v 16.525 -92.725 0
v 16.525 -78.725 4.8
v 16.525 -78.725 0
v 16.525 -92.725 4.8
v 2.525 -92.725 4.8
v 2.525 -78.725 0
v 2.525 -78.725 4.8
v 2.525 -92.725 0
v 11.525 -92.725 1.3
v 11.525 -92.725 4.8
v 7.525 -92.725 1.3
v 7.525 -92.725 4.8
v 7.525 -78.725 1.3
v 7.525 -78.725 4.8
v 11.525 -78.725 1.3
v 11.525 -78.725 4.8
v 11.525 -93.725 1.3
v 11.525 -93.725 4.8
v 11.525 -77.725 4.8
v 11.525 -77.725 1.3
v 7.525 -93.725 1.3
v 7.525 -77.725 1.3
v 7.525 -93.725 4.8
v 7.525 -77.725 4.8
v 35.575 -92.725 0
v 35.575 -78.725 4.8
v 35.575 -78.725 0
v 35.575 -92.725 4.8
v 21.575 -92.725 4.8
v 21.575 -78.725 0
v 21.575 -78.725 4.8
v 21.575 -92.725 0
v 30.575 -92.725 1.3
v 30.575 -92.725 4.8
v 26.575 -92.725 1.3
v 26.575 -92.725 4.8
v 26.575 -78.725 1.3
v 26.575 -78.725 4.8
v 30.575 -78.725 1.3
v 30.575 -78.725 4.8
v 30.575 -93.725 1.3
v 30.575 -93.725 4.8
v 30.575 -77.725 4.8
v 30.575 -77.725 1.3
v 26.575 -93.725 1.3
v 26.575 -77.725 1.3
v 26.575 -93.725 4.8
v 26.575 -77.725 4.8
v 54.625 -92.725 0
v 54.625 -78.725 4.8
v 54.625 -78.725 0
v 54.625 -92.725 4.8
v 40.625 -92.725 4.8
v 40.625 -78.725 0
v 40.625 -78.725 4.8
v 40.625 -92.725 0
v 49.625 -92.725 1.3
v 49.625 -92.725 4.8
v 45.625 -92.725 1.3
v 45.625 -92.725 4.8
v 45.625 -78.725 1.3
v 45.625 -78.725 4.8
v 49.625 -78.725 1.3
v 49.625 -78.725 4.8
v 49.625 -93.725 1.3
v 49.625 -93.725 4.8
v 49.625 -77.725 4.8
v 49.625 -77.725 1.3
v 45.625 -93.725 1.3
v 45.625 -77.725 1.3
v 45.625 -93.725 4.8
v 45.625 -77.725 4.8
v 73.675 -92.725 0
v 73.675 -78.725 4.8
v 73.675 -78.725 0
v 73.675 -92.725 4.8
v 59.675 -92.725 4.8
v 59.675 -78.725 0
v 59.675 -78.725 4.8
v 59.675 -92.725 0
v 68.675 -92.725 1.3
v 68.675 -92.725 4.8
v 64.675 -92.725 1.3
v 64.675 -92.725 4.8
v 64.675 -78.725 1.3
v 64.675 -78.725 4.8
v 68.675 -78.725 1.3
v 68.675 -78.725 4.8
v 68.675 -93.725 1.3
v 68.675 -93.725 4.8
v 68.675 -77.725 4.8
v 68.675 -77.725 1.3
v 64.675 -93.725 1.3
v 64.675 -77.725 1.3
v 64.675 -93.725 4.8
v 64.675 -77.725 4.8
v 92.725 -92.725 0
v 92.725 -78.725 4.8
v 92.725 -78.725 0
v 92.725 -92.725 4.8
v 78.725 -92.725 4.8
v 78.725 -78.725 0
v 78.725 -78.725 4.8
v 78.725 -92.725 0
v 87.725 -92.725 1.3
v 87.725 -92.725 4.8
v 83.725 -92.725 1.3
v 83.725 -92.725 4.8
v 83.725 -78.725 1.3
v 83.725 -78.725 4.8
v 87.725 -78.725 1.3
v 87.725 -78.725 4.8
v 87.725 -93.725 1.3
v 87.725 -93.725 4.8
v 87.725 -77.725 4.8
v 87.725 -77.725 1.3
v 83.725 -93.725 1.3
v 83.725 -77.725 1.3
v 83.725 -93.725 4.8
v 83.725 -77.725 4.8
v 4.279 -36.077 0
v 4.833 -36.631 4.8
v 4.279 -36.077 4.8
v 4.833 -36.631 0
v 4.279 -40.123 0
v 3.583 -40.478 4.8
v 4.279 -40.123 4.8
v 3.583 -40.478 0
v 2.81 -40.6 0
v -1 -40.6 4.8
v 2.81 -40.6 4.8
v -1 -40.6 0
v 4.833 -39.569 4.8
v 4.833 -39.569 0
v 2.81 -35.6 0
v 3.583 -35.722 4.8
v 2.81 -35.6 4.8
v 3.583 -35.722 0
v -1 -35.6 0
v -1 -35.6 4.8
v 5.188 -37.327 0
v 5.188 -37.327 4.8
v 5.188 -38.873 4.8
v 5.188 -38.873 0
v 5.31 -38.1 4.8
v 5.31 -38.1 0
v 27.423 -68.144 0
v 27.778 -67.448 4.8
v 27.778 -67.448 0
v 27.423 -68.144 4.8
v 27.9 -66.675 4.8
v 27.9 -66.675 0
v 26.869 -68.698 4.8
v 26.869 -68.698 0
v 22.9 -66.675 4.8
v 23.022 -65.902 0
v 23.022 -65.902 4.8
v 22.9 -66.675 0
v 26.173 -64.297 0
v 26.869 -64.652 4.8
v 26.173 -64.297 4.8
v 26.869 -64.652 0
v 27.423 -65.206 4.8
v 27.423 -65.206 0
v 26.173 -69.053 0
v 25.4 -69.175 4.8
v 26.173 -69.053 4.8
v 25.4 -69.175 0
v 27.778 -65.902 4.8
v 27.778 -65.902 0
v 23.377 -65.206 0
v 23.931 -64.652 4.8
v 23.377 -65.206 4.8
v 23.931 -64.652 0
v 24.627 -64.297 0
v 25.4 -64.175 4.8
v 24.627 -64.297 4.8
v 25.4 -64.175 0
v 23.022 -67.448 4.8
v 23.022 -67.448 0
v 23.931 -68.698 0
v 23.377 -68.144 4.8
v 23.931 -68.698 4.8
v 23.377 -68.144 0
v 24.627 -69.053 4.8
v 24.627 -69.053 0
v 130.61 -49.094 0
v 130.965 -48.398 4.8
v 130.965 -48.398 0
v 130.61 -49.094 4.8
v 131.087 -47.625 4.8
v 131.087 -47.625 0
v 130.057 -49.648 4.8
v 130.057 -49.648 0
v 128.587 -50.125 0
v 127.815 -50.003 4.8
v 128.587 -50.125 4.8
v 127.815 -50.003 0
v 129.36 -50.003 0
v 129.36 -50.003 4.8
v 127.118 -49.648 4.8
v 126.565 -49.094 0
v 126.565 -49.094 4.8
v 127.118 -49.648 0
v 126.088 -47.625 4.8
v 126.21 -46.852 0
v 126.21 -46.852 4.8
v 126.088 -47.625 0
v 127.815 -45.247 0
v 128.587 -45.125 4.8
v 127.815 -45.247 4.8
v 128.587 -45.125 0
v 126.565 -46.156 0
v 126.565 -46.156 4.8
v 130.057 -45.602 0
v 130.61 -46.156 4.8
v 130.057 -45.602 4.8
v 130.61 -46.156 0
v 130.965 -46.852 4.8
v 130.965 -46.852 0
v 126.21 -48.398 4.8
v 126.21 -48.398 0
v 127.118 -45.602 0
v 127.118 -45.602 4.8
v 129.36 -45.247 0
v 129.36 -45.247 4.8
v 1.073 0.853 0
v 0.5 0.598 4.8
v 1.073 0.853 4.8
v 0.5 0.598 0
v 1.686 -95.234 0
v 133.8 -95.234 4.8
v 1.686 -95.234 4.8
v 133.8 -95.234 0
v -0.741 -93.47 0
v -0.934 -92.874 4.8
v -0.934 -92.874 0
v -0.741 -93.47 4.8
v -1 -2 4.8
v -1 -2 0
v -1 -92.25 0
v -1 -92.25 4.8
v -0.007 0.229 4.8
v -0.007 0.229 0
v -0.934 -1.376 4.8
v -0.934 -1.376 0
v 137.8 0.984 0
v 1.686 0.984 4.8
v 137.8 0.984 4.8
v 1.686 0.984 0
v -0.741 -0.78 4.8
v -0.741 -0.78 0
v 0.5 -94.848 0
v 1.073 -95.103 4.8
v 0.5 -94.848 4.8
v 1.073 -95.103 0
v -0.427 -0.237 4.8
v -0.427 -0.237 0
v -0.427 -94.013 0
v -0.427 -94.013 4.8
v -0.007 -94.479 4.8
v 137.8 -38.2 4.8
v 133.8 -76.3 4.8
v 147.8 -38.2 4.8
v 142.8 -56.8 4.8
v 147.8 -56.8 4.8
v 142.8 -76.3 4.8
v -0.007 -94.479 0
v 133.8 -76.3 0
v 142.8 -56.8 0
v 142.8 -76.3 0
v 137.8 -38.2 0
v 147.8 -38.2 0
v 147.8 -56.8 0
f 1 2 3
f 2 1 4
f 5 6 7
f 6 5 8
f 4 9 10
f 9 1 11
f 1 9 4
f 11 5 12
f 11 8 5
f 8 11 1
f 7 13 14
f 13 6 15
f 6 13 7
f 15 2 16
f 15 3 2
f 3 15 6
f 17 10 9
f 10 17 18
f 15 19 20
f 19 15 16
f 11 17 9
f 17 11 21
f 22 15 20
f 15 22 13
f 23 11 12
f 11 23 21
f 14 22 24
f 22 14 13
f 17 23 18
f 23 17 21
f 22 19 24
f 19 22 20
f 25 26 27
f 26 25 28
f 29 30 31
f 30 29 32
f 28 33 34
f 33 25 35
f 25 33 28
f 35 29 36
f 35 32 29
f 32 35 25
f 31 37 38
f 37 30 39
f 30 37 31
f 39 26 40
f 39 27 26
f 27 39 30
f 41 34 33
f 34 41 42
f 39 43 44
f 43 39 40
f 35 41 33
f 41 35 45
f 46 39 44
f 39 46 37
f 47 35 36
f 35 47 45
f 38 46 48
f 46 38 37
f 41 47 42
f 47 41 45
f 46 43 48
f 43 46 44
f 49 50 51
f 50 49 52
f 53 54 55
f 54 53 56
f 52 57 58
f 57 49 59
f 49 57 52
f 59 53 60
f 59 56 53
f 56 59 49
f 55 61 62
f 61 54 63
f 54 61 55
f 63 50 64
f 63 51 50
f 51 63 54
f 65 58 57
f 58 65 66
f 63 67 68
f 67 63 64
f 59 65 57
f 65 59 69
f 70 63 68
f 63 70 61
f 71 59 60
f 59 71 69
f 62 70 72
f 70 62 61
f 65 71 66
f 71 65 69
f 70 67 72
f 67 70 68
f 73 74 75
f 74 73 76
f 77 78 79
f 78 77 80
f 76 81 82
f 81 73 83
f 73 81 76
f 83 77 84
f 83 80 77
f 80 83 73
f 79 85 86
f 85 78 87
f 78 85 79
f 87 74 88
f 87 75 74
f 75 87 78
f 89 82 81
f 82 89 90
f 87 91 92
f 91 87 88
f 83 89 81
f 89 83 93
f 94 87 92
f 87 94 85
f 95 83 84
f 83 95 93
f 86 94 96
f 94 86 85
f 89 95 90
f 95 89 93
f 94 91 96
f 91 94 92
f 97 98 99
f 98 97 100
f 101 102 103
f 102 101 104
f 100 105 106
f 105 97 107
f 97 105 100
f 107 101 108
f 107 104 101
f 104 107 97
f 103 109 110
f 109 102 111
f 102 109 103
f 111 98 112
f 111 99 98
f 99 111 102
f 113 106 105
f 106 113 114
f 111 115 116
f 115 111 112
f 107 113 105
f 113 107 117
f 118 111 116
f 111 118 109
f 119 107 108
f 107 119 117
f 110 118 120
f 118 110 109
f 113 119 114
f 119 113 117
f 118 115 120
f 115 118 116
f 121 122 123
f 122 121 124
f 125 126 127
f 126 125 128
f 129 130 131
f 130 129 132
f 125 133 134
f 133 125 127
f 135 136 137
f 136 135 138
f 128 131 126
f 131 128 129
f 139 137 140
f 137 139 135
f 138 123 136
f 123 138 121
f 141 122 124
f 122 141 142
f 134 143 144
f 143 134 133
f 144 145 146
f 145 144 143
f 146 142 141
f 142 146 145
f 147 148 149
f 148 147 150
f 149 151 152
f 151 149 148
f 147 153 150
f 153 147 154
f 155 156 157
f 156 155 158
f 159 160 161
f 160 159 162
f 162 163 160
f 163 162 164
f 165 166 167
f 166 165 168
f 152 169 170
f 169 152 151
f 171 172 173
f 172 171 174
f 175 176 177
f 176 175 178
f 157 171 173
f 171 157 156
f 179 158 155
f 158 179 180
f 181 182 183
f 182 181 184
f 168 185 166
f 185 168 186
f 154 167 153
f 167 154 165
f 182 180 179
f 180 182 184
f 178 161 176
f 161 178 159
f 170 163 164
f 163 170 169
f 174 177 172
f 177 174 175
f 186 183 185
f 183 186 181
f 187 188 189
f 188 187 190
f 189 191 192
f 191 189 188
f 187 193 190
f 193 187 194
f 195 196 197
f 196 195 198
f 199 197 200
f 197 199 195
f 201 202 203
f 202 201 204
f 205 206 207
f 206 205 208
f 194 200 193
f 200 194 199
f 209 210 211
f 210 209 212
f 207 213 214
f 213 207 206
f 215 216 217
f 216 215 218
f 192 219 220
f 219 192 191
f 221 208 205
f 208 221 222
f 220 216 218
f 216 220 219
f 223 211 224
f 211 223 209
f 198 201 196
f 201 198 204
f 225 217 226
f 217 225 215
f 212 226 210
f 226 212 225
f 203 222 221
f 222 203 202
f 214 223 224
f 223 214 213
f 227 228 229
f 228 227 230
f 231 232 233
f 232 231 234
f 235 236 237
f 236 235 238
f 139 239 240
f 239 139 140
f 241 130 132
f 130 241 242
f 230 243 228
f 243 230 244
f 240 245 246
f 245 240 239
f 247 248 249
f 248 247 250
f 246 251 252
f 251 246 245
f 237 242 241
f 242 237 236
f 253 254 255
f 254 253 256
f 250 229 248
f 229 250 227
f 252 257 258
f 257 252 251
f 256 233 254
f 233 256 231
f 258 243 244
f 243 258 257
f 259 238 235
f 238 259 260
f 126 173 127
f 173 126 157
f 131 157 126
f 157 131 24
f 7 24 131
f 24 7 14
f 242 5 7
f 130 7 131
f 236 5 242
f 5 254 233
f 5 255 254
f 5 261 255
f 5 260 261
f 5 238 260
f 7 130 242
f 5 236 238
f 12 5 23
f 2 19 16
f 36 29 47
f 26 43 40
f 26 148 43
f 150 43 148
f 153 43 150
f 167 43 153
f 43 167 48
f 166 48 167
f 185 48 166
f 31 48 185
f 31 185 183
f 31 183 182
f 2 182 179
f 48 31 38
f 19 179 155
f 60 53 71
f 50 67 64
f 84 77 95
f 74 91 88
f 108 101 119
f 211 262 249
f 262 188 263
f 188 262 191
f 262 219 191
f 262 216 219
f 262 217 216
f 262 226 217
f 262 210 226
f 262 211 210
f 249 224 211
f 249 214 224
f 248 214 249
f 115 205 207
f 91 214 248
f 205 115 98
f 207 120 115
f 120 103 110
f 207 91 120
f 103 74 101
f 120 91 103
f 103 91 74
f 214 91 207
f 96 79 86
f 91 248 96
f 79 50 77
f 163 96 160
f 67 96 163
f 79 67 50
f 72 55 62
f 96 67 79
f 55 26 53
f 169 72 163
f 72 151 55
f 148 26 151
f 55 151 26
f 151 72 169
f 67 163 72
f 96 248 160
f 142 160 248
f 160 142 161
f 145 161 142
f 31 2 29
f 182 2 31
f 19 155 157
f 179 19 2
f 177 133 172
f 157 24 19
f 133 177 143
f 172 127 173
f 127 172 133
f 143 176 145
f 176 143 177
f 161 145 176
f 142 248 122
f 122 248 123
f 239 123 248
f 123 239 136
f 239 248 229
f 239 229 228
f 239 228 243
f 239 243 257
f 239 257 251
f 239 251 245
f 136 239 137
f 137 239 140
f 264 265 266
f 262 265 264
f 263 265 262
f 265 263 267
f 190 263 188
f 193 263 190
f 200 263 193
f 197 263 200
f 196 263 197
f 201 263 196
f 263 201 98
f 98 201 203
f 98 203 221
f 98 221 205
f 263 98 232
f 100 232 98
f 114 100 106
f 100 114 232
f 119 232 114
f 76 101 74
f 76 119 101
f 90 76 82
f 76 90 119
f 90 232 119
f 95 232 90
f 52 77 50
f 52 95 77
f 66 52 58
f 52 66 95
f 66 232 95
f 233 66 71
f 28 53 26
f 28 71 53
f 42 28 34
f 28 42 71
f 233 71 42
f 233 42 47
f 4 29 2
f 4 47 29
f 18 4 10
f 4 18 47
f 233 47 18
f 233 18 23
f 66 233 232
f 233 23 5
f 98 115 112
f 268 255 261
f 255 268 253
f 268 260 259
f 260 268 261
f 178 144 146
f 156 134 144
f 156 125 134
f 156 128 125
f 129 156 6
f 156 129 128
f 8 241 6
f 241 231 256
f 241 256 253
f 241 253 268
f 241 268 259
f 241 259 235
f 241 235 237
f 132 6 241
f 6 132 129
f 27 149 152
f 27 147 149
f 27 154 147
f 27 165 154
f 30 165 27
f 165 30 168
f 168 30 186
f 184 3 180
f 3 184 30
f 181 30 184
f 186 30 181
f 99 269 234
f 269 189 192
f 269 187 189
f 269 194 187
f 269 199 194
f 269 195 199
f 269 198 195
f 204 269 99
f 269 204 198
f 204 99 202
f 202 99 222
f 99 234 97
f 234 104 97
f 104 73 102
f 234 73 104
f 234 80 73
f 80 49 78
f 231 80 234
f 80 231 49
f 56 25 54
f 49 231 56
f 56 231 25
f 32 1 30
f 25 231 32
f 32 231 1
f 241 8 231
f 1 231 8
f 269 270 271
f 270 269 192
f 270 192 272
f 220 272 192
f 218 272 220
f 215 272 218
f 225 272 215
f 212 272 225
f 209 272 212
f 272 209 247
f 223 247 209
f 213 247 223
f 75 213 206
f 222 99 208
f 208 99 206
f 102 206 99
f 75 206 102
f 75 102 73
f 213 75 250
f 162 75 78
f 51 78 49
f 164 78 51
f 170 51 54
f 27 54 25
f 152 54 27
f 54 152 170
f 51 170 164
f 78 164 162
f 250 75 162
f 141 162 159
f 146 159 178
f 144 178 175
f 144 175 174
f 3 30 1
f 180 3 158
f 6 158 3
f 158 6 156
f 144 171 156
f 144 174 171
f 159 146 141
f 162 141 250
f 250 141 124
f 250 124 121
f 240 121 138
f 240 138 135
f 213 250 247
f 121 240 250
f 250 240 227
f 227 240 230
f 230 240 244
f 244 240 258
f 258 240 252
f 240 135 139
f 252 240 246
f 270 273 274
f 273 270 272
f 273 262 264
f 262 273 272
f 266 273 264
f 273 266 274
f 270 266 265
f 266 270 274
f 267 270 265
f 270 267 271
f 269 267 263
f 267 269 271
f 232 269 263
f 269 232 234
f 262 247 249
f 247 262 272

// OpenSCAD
// NOTE:
// - I think that a little more tuning of the space around screw-in stabs is
//   in order. Acrylic version was a bit of a tight fit when printed at 0.3mm.
//   Maybe need a little more space in the Y?
//

//Thickness of entire plate
plateThickness=4.8;
//Unit square length, from Cherry MX data sheet
lkey=19.05;
//Hole size, from Cherry MX data sheet
holesize=14;
//length, in units, of board
width=15;
//Height, in units, of board
height=5;
//Radius of mounting holes
mountingholeradius=2.5;
//height of switch clasp cutouts
cutoutheight = 3;
//width of switch clasp cutouts
cutoutwidth = 1;

cornerradius=3;

//calculated vars

holediff=lkey-holesize;
w=width*lkey;
h=height*lkey;

//
// THINGS TO PRINT
//
if (1) {
    translate([0,0,plateThickness]) rotate([180,0,0]) intersection() {
        acrylicDZPlate();
        lhs(slop=0.2);
    }
}

module lhs(slop=0.2) {
    translate([0,0,-1]) linear_extrude(height=plateThickness+2)
        polygon(points=[[-2,-2], [-2,100], [134-slop,100], [134-slop,76.5-slop],
                        [143-slop,76.5-slop], [143-slop,57-slop],
                        [148-slop,57-slop], [148-slop,38+slop],
                        [138-slop,38+slop], [138-slop,-2]]);
}


//poker keyboard layout layer
pokerkeyboard = [
//start ROW 0
[[0,0],1],
[[1,0],1],
[[2,0],1],
[[3,0],1],
[[4,0],1],
// [[13,0],2, "d"],
];

module plate(w,h,extraLeft=0,extraBottom=0,extraTop=0,extraRight=0){
        hull() {
        translate([cornerradius-extraLeft,cornerradius-extraBottom]) cylinder(r=cornerradius,h=plateThickness);
            translate([w-cornerradius+extraRight,cornerradius-extraBottom]) cylinder(r=cornerradius,h=plateThickness);
            translate([cornerradius-extraLeft,h-cornerradius+extraTop]) cylinder(r=cornerradius,h=plateThickness);
            translate([w-cornerradius+extraRight,h-cornerradius+extraTop]) cylinder(r=cornerradius,h=plateThickness);
    }
    // cube([w,h,plateThickness]);
}

// note: +0.2 is to make for clean differences

module switchhole(size=1,openable=0,up=1){
    translate([0,0,-0.1]) union(){
        cube([holesize,holesize,plateThickness+0.2]);
                translate([holesize/2-2,-1,0]) cube([4,holesize+2,plateThickness+0.1 - 1.3]); // for clip to catch

                if (openable) {
            translate([-cutoutwidth,1,0])
            cube([holesize+2*cutoutwidth,cutoutheight,plateThickness+0.2]);

            translate([-cutoutwidth,holesize-cutoutwidth-cutoutheight,0])
            cube([holesize+2*cutoutwidth,cutoutheight,plateThickness+0.2]);
        }

        if (size >= 2) {
            translate([-8.4,-1*(18-holesize)/2,0])
                cube([6.9,18,plateThickness+0.1-2]);
            translate([holesize+1.5,-1*(18-holesize)/2,0])
                cube([6.9,18,plateThickness+0.1-2]);

            if (up) {
                translate([-8.4,1,0])
                    cube([6.9,holesize-1,plateThickness+0.2]);
                translate([holesize+1.5,1,0])
                    cube([6.9,holesize-1,plateThickness+0.2]);
                translate([-8.4,holesize-0.1,0])
                    cube([holesize + 16.8,3.1,plateThickness+0.1-1.5]);
            }
            else {
                translate([-8.4,0,0])
                    cube([6.9,holesize-1,plateThickness+0.2]);
                translate([holesize+1.5,0,0])
                    cube([6.9,holesize-1,plateThickness+0.2]);
                translate([-8.4,-3,0])
                    cube([holesize + 16.8,3.1,plateThickness+0.1-1.5]);
            }
        }
    }
}

module holematrix(holes,startx,starty){
    for (key = holes){
        translate([startx+lkey*key[0][0], starty-lkey*key[0][1], 0])
        translate([(lkey*key[1]-holesize)/2,(lkey - holesize)/2, 0])
        switchhole(size=key[1],up=(key[2] == "u" ? 1 : 0));
    }
}

module mountingholes(outsides=1, dzExtras=1){
    translate([(1+1/3)*lkey,3.5*lkey,-0.1])
    cylinder(h=plateThickness+0.2,r=mountingholeradius, $fn=20);

    translate([(13+2/3)*lkey,3.5*lkey,-0.1])
    cylinder(h=plateThickness+0.2,r=mountingholeradius, $fn=20);
    
    translate([(6.75)*lkey,2.5*lkey,-0.1])
    cylinder(h=plateThickness+0.2,r=mountingholeradius, $fn=20);

    translate([(6.75)*lkey,2.5*lkey,-0.1])
    cylinder(h=plateThickness+0.2,r=mountingholeradius, $fn=20);

    translate([(10)*lkey,.5*lkey,-0.1])
    cylinder(h=plateThickness+0.2,r=mountingholeradius, $fn=20);

    if (outsides) {
        hull() {
            // note: the original offset in X was 0.2*lkey; modded for acrylic
            // translate([(.2)*lkey,2*lkey,-0.1])
            //
            translate([(.2)*lkey-1,2*lkey,-0.1])
            cylinder(h=plateThickness+0.2,r=mountingholeradius, $fn=20);
            // added to extend LHS hole to edge
            translate([-1,2*lkey,-0.1])
            cylinder(h=plateThickness+0.2,r=mountingholeradius, $fn=20);
        }

        hull() {
            translate([(14.8)*lkey,2*lkey,-0.1])
            cylinder(h=plateThickness+0.2,r=mountingholeradius, $fn=20);

            translate([(14.8)*lkey+10,2*lkey,-0.1])
            cylinder(h=plateThickness+0.2,r=mountingholeradius, $fn=20);
        }
    }

    if (dzExtras) {
        translate([(1.25)*lkey,.5*lkey,-0.1])
        cylinder(h=plateThickness+0.2,r=mountingholeradius, $fn=20);

        translate([(4)*lkey,4.5*lkey,-0.1])
        cylinder(h=plateThickness+0.2,r=mountingholeradius, $fn=20);

        translate([(10)*lkey,4.5*lkey,-0.1])
        cylinder(h=plateThickness+0.2,r=mountingholeradius, $fn=20);
        
    }
}

module acrylicDZPlate(){
    $fn=30;
    difference(){
        plate(w,h,extraLeft=1,extraBottom=1,extraRight=2);
        // plate(w,h);
        holematrix(pokerkeyboard,0,h-lkey);
        mountingholes(dzExtras=0);
    }
}

// translate([0,0,3]) import(file="swillkb.dxf");
